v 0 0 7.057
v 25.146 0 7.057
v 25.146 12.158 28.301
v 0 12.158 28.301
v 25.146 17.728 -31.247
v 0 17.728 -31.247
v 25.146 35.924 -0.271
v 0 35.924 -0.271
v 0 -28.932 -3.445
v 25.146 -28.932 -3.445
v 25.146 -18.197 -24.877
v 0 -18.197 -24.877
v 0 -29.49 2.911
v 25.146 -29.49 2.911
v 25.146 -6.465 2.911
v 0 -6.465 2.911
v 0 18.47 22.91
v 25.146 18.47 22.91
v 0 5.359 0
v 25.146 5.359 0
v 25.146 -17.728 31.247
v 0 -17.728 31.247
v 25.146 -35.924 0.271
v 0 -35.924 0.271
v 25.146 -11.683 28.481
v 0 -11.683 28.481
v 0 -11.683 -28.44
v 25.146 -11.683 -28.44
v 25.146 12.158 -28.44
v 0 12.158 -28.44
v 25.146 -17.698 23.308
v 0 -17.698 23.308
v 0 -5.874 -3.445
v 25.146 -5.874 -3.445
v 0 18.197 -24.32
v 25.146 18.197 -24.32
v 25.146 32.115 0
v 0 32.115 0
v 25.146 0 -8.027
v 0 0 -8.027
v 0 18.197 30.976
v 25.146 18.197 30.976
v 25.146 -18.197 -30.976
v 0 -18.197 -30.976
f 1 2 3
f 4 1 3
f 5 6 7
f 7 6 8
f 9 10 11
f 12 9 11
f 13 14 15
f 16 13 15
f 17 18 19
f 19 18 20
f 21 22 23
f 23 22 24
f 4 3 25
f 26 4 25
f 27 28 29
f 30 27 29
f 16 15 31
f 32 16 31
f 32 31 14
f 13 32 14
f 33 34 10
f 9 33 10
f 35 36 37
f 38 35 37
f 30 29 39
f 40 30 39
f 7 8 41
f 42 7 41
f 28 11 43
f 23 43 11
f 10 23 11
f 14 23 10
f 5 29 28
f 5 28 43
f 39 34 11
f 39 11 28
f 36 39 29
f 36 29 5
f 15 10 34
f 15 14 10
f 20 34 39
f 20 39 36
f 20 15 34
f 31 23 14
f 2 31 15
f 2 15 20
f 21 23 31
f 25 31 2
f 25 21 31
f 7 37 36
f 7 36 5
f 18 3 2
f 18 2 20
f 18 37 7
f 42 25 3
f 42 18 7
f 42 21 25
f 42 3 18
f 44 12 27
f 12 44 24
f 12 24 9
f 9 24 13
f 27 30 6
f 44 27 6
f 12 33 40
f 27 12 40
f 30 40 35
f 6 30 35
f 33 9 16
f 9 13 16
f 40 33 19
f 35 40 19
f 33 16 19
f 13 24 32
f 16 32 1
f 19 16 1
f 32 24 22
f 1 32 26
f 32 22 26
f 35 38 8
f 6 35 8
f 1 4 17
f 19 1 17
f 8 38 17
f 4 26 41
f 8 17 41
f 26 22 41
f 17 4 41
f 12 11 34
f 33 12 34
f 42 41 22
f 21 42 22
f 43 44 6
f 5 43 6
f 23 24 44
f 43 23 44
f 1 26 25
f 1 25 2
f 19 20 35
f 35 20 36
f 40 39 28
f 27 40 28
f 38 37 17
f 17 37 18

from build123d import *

# Parameters (mm, degrees)
F1_DEPTH = 25.146
F3_DEPTH = 25.147


with BuildPart() as f1:
    # F0 (on Right) → F1 (new body)
    with BuildSketch(Plane.YZ):
        Polygon((-18.196719, -30.976094), (17.727725, -31.246868), (35.924444, -0.270774), (18.196719, 30.976094), (-17.727725, 31.246868), (-35.924444, 0.270774), align=None)
    extrude(amount=F1_DEPTH)

    # F2 (on face) → F3 (cut, through all)
    with BuildSketch(Plane.YZ.offset(25.146)):
        Polygon((12.158216, 28.30131), (-11.682742, 28.481007), (0, 7.056957), align=None)
        Polygon((18.470482, 22.909693), (5.359186, 0), (18.196719, -24.320445), (32.115393, 0), align=None)
        Polygon((12.158216, -28.440368), (0, -8.026823), (-11.682742, -28.440368), align=None)
        Polygon((-5.873994, -3.44487), (-28.931567, -3.44487), (-18.196719, -24.876591), align=None)
        Polygon((-6.465211, 2.910744), (-17.69839, 23.307832), (-29.490458, 2.910744), align=None)
    extrude(amount=-F3_DEPTH, mode=Mode.SUBTRACT)


solid = f1.part
